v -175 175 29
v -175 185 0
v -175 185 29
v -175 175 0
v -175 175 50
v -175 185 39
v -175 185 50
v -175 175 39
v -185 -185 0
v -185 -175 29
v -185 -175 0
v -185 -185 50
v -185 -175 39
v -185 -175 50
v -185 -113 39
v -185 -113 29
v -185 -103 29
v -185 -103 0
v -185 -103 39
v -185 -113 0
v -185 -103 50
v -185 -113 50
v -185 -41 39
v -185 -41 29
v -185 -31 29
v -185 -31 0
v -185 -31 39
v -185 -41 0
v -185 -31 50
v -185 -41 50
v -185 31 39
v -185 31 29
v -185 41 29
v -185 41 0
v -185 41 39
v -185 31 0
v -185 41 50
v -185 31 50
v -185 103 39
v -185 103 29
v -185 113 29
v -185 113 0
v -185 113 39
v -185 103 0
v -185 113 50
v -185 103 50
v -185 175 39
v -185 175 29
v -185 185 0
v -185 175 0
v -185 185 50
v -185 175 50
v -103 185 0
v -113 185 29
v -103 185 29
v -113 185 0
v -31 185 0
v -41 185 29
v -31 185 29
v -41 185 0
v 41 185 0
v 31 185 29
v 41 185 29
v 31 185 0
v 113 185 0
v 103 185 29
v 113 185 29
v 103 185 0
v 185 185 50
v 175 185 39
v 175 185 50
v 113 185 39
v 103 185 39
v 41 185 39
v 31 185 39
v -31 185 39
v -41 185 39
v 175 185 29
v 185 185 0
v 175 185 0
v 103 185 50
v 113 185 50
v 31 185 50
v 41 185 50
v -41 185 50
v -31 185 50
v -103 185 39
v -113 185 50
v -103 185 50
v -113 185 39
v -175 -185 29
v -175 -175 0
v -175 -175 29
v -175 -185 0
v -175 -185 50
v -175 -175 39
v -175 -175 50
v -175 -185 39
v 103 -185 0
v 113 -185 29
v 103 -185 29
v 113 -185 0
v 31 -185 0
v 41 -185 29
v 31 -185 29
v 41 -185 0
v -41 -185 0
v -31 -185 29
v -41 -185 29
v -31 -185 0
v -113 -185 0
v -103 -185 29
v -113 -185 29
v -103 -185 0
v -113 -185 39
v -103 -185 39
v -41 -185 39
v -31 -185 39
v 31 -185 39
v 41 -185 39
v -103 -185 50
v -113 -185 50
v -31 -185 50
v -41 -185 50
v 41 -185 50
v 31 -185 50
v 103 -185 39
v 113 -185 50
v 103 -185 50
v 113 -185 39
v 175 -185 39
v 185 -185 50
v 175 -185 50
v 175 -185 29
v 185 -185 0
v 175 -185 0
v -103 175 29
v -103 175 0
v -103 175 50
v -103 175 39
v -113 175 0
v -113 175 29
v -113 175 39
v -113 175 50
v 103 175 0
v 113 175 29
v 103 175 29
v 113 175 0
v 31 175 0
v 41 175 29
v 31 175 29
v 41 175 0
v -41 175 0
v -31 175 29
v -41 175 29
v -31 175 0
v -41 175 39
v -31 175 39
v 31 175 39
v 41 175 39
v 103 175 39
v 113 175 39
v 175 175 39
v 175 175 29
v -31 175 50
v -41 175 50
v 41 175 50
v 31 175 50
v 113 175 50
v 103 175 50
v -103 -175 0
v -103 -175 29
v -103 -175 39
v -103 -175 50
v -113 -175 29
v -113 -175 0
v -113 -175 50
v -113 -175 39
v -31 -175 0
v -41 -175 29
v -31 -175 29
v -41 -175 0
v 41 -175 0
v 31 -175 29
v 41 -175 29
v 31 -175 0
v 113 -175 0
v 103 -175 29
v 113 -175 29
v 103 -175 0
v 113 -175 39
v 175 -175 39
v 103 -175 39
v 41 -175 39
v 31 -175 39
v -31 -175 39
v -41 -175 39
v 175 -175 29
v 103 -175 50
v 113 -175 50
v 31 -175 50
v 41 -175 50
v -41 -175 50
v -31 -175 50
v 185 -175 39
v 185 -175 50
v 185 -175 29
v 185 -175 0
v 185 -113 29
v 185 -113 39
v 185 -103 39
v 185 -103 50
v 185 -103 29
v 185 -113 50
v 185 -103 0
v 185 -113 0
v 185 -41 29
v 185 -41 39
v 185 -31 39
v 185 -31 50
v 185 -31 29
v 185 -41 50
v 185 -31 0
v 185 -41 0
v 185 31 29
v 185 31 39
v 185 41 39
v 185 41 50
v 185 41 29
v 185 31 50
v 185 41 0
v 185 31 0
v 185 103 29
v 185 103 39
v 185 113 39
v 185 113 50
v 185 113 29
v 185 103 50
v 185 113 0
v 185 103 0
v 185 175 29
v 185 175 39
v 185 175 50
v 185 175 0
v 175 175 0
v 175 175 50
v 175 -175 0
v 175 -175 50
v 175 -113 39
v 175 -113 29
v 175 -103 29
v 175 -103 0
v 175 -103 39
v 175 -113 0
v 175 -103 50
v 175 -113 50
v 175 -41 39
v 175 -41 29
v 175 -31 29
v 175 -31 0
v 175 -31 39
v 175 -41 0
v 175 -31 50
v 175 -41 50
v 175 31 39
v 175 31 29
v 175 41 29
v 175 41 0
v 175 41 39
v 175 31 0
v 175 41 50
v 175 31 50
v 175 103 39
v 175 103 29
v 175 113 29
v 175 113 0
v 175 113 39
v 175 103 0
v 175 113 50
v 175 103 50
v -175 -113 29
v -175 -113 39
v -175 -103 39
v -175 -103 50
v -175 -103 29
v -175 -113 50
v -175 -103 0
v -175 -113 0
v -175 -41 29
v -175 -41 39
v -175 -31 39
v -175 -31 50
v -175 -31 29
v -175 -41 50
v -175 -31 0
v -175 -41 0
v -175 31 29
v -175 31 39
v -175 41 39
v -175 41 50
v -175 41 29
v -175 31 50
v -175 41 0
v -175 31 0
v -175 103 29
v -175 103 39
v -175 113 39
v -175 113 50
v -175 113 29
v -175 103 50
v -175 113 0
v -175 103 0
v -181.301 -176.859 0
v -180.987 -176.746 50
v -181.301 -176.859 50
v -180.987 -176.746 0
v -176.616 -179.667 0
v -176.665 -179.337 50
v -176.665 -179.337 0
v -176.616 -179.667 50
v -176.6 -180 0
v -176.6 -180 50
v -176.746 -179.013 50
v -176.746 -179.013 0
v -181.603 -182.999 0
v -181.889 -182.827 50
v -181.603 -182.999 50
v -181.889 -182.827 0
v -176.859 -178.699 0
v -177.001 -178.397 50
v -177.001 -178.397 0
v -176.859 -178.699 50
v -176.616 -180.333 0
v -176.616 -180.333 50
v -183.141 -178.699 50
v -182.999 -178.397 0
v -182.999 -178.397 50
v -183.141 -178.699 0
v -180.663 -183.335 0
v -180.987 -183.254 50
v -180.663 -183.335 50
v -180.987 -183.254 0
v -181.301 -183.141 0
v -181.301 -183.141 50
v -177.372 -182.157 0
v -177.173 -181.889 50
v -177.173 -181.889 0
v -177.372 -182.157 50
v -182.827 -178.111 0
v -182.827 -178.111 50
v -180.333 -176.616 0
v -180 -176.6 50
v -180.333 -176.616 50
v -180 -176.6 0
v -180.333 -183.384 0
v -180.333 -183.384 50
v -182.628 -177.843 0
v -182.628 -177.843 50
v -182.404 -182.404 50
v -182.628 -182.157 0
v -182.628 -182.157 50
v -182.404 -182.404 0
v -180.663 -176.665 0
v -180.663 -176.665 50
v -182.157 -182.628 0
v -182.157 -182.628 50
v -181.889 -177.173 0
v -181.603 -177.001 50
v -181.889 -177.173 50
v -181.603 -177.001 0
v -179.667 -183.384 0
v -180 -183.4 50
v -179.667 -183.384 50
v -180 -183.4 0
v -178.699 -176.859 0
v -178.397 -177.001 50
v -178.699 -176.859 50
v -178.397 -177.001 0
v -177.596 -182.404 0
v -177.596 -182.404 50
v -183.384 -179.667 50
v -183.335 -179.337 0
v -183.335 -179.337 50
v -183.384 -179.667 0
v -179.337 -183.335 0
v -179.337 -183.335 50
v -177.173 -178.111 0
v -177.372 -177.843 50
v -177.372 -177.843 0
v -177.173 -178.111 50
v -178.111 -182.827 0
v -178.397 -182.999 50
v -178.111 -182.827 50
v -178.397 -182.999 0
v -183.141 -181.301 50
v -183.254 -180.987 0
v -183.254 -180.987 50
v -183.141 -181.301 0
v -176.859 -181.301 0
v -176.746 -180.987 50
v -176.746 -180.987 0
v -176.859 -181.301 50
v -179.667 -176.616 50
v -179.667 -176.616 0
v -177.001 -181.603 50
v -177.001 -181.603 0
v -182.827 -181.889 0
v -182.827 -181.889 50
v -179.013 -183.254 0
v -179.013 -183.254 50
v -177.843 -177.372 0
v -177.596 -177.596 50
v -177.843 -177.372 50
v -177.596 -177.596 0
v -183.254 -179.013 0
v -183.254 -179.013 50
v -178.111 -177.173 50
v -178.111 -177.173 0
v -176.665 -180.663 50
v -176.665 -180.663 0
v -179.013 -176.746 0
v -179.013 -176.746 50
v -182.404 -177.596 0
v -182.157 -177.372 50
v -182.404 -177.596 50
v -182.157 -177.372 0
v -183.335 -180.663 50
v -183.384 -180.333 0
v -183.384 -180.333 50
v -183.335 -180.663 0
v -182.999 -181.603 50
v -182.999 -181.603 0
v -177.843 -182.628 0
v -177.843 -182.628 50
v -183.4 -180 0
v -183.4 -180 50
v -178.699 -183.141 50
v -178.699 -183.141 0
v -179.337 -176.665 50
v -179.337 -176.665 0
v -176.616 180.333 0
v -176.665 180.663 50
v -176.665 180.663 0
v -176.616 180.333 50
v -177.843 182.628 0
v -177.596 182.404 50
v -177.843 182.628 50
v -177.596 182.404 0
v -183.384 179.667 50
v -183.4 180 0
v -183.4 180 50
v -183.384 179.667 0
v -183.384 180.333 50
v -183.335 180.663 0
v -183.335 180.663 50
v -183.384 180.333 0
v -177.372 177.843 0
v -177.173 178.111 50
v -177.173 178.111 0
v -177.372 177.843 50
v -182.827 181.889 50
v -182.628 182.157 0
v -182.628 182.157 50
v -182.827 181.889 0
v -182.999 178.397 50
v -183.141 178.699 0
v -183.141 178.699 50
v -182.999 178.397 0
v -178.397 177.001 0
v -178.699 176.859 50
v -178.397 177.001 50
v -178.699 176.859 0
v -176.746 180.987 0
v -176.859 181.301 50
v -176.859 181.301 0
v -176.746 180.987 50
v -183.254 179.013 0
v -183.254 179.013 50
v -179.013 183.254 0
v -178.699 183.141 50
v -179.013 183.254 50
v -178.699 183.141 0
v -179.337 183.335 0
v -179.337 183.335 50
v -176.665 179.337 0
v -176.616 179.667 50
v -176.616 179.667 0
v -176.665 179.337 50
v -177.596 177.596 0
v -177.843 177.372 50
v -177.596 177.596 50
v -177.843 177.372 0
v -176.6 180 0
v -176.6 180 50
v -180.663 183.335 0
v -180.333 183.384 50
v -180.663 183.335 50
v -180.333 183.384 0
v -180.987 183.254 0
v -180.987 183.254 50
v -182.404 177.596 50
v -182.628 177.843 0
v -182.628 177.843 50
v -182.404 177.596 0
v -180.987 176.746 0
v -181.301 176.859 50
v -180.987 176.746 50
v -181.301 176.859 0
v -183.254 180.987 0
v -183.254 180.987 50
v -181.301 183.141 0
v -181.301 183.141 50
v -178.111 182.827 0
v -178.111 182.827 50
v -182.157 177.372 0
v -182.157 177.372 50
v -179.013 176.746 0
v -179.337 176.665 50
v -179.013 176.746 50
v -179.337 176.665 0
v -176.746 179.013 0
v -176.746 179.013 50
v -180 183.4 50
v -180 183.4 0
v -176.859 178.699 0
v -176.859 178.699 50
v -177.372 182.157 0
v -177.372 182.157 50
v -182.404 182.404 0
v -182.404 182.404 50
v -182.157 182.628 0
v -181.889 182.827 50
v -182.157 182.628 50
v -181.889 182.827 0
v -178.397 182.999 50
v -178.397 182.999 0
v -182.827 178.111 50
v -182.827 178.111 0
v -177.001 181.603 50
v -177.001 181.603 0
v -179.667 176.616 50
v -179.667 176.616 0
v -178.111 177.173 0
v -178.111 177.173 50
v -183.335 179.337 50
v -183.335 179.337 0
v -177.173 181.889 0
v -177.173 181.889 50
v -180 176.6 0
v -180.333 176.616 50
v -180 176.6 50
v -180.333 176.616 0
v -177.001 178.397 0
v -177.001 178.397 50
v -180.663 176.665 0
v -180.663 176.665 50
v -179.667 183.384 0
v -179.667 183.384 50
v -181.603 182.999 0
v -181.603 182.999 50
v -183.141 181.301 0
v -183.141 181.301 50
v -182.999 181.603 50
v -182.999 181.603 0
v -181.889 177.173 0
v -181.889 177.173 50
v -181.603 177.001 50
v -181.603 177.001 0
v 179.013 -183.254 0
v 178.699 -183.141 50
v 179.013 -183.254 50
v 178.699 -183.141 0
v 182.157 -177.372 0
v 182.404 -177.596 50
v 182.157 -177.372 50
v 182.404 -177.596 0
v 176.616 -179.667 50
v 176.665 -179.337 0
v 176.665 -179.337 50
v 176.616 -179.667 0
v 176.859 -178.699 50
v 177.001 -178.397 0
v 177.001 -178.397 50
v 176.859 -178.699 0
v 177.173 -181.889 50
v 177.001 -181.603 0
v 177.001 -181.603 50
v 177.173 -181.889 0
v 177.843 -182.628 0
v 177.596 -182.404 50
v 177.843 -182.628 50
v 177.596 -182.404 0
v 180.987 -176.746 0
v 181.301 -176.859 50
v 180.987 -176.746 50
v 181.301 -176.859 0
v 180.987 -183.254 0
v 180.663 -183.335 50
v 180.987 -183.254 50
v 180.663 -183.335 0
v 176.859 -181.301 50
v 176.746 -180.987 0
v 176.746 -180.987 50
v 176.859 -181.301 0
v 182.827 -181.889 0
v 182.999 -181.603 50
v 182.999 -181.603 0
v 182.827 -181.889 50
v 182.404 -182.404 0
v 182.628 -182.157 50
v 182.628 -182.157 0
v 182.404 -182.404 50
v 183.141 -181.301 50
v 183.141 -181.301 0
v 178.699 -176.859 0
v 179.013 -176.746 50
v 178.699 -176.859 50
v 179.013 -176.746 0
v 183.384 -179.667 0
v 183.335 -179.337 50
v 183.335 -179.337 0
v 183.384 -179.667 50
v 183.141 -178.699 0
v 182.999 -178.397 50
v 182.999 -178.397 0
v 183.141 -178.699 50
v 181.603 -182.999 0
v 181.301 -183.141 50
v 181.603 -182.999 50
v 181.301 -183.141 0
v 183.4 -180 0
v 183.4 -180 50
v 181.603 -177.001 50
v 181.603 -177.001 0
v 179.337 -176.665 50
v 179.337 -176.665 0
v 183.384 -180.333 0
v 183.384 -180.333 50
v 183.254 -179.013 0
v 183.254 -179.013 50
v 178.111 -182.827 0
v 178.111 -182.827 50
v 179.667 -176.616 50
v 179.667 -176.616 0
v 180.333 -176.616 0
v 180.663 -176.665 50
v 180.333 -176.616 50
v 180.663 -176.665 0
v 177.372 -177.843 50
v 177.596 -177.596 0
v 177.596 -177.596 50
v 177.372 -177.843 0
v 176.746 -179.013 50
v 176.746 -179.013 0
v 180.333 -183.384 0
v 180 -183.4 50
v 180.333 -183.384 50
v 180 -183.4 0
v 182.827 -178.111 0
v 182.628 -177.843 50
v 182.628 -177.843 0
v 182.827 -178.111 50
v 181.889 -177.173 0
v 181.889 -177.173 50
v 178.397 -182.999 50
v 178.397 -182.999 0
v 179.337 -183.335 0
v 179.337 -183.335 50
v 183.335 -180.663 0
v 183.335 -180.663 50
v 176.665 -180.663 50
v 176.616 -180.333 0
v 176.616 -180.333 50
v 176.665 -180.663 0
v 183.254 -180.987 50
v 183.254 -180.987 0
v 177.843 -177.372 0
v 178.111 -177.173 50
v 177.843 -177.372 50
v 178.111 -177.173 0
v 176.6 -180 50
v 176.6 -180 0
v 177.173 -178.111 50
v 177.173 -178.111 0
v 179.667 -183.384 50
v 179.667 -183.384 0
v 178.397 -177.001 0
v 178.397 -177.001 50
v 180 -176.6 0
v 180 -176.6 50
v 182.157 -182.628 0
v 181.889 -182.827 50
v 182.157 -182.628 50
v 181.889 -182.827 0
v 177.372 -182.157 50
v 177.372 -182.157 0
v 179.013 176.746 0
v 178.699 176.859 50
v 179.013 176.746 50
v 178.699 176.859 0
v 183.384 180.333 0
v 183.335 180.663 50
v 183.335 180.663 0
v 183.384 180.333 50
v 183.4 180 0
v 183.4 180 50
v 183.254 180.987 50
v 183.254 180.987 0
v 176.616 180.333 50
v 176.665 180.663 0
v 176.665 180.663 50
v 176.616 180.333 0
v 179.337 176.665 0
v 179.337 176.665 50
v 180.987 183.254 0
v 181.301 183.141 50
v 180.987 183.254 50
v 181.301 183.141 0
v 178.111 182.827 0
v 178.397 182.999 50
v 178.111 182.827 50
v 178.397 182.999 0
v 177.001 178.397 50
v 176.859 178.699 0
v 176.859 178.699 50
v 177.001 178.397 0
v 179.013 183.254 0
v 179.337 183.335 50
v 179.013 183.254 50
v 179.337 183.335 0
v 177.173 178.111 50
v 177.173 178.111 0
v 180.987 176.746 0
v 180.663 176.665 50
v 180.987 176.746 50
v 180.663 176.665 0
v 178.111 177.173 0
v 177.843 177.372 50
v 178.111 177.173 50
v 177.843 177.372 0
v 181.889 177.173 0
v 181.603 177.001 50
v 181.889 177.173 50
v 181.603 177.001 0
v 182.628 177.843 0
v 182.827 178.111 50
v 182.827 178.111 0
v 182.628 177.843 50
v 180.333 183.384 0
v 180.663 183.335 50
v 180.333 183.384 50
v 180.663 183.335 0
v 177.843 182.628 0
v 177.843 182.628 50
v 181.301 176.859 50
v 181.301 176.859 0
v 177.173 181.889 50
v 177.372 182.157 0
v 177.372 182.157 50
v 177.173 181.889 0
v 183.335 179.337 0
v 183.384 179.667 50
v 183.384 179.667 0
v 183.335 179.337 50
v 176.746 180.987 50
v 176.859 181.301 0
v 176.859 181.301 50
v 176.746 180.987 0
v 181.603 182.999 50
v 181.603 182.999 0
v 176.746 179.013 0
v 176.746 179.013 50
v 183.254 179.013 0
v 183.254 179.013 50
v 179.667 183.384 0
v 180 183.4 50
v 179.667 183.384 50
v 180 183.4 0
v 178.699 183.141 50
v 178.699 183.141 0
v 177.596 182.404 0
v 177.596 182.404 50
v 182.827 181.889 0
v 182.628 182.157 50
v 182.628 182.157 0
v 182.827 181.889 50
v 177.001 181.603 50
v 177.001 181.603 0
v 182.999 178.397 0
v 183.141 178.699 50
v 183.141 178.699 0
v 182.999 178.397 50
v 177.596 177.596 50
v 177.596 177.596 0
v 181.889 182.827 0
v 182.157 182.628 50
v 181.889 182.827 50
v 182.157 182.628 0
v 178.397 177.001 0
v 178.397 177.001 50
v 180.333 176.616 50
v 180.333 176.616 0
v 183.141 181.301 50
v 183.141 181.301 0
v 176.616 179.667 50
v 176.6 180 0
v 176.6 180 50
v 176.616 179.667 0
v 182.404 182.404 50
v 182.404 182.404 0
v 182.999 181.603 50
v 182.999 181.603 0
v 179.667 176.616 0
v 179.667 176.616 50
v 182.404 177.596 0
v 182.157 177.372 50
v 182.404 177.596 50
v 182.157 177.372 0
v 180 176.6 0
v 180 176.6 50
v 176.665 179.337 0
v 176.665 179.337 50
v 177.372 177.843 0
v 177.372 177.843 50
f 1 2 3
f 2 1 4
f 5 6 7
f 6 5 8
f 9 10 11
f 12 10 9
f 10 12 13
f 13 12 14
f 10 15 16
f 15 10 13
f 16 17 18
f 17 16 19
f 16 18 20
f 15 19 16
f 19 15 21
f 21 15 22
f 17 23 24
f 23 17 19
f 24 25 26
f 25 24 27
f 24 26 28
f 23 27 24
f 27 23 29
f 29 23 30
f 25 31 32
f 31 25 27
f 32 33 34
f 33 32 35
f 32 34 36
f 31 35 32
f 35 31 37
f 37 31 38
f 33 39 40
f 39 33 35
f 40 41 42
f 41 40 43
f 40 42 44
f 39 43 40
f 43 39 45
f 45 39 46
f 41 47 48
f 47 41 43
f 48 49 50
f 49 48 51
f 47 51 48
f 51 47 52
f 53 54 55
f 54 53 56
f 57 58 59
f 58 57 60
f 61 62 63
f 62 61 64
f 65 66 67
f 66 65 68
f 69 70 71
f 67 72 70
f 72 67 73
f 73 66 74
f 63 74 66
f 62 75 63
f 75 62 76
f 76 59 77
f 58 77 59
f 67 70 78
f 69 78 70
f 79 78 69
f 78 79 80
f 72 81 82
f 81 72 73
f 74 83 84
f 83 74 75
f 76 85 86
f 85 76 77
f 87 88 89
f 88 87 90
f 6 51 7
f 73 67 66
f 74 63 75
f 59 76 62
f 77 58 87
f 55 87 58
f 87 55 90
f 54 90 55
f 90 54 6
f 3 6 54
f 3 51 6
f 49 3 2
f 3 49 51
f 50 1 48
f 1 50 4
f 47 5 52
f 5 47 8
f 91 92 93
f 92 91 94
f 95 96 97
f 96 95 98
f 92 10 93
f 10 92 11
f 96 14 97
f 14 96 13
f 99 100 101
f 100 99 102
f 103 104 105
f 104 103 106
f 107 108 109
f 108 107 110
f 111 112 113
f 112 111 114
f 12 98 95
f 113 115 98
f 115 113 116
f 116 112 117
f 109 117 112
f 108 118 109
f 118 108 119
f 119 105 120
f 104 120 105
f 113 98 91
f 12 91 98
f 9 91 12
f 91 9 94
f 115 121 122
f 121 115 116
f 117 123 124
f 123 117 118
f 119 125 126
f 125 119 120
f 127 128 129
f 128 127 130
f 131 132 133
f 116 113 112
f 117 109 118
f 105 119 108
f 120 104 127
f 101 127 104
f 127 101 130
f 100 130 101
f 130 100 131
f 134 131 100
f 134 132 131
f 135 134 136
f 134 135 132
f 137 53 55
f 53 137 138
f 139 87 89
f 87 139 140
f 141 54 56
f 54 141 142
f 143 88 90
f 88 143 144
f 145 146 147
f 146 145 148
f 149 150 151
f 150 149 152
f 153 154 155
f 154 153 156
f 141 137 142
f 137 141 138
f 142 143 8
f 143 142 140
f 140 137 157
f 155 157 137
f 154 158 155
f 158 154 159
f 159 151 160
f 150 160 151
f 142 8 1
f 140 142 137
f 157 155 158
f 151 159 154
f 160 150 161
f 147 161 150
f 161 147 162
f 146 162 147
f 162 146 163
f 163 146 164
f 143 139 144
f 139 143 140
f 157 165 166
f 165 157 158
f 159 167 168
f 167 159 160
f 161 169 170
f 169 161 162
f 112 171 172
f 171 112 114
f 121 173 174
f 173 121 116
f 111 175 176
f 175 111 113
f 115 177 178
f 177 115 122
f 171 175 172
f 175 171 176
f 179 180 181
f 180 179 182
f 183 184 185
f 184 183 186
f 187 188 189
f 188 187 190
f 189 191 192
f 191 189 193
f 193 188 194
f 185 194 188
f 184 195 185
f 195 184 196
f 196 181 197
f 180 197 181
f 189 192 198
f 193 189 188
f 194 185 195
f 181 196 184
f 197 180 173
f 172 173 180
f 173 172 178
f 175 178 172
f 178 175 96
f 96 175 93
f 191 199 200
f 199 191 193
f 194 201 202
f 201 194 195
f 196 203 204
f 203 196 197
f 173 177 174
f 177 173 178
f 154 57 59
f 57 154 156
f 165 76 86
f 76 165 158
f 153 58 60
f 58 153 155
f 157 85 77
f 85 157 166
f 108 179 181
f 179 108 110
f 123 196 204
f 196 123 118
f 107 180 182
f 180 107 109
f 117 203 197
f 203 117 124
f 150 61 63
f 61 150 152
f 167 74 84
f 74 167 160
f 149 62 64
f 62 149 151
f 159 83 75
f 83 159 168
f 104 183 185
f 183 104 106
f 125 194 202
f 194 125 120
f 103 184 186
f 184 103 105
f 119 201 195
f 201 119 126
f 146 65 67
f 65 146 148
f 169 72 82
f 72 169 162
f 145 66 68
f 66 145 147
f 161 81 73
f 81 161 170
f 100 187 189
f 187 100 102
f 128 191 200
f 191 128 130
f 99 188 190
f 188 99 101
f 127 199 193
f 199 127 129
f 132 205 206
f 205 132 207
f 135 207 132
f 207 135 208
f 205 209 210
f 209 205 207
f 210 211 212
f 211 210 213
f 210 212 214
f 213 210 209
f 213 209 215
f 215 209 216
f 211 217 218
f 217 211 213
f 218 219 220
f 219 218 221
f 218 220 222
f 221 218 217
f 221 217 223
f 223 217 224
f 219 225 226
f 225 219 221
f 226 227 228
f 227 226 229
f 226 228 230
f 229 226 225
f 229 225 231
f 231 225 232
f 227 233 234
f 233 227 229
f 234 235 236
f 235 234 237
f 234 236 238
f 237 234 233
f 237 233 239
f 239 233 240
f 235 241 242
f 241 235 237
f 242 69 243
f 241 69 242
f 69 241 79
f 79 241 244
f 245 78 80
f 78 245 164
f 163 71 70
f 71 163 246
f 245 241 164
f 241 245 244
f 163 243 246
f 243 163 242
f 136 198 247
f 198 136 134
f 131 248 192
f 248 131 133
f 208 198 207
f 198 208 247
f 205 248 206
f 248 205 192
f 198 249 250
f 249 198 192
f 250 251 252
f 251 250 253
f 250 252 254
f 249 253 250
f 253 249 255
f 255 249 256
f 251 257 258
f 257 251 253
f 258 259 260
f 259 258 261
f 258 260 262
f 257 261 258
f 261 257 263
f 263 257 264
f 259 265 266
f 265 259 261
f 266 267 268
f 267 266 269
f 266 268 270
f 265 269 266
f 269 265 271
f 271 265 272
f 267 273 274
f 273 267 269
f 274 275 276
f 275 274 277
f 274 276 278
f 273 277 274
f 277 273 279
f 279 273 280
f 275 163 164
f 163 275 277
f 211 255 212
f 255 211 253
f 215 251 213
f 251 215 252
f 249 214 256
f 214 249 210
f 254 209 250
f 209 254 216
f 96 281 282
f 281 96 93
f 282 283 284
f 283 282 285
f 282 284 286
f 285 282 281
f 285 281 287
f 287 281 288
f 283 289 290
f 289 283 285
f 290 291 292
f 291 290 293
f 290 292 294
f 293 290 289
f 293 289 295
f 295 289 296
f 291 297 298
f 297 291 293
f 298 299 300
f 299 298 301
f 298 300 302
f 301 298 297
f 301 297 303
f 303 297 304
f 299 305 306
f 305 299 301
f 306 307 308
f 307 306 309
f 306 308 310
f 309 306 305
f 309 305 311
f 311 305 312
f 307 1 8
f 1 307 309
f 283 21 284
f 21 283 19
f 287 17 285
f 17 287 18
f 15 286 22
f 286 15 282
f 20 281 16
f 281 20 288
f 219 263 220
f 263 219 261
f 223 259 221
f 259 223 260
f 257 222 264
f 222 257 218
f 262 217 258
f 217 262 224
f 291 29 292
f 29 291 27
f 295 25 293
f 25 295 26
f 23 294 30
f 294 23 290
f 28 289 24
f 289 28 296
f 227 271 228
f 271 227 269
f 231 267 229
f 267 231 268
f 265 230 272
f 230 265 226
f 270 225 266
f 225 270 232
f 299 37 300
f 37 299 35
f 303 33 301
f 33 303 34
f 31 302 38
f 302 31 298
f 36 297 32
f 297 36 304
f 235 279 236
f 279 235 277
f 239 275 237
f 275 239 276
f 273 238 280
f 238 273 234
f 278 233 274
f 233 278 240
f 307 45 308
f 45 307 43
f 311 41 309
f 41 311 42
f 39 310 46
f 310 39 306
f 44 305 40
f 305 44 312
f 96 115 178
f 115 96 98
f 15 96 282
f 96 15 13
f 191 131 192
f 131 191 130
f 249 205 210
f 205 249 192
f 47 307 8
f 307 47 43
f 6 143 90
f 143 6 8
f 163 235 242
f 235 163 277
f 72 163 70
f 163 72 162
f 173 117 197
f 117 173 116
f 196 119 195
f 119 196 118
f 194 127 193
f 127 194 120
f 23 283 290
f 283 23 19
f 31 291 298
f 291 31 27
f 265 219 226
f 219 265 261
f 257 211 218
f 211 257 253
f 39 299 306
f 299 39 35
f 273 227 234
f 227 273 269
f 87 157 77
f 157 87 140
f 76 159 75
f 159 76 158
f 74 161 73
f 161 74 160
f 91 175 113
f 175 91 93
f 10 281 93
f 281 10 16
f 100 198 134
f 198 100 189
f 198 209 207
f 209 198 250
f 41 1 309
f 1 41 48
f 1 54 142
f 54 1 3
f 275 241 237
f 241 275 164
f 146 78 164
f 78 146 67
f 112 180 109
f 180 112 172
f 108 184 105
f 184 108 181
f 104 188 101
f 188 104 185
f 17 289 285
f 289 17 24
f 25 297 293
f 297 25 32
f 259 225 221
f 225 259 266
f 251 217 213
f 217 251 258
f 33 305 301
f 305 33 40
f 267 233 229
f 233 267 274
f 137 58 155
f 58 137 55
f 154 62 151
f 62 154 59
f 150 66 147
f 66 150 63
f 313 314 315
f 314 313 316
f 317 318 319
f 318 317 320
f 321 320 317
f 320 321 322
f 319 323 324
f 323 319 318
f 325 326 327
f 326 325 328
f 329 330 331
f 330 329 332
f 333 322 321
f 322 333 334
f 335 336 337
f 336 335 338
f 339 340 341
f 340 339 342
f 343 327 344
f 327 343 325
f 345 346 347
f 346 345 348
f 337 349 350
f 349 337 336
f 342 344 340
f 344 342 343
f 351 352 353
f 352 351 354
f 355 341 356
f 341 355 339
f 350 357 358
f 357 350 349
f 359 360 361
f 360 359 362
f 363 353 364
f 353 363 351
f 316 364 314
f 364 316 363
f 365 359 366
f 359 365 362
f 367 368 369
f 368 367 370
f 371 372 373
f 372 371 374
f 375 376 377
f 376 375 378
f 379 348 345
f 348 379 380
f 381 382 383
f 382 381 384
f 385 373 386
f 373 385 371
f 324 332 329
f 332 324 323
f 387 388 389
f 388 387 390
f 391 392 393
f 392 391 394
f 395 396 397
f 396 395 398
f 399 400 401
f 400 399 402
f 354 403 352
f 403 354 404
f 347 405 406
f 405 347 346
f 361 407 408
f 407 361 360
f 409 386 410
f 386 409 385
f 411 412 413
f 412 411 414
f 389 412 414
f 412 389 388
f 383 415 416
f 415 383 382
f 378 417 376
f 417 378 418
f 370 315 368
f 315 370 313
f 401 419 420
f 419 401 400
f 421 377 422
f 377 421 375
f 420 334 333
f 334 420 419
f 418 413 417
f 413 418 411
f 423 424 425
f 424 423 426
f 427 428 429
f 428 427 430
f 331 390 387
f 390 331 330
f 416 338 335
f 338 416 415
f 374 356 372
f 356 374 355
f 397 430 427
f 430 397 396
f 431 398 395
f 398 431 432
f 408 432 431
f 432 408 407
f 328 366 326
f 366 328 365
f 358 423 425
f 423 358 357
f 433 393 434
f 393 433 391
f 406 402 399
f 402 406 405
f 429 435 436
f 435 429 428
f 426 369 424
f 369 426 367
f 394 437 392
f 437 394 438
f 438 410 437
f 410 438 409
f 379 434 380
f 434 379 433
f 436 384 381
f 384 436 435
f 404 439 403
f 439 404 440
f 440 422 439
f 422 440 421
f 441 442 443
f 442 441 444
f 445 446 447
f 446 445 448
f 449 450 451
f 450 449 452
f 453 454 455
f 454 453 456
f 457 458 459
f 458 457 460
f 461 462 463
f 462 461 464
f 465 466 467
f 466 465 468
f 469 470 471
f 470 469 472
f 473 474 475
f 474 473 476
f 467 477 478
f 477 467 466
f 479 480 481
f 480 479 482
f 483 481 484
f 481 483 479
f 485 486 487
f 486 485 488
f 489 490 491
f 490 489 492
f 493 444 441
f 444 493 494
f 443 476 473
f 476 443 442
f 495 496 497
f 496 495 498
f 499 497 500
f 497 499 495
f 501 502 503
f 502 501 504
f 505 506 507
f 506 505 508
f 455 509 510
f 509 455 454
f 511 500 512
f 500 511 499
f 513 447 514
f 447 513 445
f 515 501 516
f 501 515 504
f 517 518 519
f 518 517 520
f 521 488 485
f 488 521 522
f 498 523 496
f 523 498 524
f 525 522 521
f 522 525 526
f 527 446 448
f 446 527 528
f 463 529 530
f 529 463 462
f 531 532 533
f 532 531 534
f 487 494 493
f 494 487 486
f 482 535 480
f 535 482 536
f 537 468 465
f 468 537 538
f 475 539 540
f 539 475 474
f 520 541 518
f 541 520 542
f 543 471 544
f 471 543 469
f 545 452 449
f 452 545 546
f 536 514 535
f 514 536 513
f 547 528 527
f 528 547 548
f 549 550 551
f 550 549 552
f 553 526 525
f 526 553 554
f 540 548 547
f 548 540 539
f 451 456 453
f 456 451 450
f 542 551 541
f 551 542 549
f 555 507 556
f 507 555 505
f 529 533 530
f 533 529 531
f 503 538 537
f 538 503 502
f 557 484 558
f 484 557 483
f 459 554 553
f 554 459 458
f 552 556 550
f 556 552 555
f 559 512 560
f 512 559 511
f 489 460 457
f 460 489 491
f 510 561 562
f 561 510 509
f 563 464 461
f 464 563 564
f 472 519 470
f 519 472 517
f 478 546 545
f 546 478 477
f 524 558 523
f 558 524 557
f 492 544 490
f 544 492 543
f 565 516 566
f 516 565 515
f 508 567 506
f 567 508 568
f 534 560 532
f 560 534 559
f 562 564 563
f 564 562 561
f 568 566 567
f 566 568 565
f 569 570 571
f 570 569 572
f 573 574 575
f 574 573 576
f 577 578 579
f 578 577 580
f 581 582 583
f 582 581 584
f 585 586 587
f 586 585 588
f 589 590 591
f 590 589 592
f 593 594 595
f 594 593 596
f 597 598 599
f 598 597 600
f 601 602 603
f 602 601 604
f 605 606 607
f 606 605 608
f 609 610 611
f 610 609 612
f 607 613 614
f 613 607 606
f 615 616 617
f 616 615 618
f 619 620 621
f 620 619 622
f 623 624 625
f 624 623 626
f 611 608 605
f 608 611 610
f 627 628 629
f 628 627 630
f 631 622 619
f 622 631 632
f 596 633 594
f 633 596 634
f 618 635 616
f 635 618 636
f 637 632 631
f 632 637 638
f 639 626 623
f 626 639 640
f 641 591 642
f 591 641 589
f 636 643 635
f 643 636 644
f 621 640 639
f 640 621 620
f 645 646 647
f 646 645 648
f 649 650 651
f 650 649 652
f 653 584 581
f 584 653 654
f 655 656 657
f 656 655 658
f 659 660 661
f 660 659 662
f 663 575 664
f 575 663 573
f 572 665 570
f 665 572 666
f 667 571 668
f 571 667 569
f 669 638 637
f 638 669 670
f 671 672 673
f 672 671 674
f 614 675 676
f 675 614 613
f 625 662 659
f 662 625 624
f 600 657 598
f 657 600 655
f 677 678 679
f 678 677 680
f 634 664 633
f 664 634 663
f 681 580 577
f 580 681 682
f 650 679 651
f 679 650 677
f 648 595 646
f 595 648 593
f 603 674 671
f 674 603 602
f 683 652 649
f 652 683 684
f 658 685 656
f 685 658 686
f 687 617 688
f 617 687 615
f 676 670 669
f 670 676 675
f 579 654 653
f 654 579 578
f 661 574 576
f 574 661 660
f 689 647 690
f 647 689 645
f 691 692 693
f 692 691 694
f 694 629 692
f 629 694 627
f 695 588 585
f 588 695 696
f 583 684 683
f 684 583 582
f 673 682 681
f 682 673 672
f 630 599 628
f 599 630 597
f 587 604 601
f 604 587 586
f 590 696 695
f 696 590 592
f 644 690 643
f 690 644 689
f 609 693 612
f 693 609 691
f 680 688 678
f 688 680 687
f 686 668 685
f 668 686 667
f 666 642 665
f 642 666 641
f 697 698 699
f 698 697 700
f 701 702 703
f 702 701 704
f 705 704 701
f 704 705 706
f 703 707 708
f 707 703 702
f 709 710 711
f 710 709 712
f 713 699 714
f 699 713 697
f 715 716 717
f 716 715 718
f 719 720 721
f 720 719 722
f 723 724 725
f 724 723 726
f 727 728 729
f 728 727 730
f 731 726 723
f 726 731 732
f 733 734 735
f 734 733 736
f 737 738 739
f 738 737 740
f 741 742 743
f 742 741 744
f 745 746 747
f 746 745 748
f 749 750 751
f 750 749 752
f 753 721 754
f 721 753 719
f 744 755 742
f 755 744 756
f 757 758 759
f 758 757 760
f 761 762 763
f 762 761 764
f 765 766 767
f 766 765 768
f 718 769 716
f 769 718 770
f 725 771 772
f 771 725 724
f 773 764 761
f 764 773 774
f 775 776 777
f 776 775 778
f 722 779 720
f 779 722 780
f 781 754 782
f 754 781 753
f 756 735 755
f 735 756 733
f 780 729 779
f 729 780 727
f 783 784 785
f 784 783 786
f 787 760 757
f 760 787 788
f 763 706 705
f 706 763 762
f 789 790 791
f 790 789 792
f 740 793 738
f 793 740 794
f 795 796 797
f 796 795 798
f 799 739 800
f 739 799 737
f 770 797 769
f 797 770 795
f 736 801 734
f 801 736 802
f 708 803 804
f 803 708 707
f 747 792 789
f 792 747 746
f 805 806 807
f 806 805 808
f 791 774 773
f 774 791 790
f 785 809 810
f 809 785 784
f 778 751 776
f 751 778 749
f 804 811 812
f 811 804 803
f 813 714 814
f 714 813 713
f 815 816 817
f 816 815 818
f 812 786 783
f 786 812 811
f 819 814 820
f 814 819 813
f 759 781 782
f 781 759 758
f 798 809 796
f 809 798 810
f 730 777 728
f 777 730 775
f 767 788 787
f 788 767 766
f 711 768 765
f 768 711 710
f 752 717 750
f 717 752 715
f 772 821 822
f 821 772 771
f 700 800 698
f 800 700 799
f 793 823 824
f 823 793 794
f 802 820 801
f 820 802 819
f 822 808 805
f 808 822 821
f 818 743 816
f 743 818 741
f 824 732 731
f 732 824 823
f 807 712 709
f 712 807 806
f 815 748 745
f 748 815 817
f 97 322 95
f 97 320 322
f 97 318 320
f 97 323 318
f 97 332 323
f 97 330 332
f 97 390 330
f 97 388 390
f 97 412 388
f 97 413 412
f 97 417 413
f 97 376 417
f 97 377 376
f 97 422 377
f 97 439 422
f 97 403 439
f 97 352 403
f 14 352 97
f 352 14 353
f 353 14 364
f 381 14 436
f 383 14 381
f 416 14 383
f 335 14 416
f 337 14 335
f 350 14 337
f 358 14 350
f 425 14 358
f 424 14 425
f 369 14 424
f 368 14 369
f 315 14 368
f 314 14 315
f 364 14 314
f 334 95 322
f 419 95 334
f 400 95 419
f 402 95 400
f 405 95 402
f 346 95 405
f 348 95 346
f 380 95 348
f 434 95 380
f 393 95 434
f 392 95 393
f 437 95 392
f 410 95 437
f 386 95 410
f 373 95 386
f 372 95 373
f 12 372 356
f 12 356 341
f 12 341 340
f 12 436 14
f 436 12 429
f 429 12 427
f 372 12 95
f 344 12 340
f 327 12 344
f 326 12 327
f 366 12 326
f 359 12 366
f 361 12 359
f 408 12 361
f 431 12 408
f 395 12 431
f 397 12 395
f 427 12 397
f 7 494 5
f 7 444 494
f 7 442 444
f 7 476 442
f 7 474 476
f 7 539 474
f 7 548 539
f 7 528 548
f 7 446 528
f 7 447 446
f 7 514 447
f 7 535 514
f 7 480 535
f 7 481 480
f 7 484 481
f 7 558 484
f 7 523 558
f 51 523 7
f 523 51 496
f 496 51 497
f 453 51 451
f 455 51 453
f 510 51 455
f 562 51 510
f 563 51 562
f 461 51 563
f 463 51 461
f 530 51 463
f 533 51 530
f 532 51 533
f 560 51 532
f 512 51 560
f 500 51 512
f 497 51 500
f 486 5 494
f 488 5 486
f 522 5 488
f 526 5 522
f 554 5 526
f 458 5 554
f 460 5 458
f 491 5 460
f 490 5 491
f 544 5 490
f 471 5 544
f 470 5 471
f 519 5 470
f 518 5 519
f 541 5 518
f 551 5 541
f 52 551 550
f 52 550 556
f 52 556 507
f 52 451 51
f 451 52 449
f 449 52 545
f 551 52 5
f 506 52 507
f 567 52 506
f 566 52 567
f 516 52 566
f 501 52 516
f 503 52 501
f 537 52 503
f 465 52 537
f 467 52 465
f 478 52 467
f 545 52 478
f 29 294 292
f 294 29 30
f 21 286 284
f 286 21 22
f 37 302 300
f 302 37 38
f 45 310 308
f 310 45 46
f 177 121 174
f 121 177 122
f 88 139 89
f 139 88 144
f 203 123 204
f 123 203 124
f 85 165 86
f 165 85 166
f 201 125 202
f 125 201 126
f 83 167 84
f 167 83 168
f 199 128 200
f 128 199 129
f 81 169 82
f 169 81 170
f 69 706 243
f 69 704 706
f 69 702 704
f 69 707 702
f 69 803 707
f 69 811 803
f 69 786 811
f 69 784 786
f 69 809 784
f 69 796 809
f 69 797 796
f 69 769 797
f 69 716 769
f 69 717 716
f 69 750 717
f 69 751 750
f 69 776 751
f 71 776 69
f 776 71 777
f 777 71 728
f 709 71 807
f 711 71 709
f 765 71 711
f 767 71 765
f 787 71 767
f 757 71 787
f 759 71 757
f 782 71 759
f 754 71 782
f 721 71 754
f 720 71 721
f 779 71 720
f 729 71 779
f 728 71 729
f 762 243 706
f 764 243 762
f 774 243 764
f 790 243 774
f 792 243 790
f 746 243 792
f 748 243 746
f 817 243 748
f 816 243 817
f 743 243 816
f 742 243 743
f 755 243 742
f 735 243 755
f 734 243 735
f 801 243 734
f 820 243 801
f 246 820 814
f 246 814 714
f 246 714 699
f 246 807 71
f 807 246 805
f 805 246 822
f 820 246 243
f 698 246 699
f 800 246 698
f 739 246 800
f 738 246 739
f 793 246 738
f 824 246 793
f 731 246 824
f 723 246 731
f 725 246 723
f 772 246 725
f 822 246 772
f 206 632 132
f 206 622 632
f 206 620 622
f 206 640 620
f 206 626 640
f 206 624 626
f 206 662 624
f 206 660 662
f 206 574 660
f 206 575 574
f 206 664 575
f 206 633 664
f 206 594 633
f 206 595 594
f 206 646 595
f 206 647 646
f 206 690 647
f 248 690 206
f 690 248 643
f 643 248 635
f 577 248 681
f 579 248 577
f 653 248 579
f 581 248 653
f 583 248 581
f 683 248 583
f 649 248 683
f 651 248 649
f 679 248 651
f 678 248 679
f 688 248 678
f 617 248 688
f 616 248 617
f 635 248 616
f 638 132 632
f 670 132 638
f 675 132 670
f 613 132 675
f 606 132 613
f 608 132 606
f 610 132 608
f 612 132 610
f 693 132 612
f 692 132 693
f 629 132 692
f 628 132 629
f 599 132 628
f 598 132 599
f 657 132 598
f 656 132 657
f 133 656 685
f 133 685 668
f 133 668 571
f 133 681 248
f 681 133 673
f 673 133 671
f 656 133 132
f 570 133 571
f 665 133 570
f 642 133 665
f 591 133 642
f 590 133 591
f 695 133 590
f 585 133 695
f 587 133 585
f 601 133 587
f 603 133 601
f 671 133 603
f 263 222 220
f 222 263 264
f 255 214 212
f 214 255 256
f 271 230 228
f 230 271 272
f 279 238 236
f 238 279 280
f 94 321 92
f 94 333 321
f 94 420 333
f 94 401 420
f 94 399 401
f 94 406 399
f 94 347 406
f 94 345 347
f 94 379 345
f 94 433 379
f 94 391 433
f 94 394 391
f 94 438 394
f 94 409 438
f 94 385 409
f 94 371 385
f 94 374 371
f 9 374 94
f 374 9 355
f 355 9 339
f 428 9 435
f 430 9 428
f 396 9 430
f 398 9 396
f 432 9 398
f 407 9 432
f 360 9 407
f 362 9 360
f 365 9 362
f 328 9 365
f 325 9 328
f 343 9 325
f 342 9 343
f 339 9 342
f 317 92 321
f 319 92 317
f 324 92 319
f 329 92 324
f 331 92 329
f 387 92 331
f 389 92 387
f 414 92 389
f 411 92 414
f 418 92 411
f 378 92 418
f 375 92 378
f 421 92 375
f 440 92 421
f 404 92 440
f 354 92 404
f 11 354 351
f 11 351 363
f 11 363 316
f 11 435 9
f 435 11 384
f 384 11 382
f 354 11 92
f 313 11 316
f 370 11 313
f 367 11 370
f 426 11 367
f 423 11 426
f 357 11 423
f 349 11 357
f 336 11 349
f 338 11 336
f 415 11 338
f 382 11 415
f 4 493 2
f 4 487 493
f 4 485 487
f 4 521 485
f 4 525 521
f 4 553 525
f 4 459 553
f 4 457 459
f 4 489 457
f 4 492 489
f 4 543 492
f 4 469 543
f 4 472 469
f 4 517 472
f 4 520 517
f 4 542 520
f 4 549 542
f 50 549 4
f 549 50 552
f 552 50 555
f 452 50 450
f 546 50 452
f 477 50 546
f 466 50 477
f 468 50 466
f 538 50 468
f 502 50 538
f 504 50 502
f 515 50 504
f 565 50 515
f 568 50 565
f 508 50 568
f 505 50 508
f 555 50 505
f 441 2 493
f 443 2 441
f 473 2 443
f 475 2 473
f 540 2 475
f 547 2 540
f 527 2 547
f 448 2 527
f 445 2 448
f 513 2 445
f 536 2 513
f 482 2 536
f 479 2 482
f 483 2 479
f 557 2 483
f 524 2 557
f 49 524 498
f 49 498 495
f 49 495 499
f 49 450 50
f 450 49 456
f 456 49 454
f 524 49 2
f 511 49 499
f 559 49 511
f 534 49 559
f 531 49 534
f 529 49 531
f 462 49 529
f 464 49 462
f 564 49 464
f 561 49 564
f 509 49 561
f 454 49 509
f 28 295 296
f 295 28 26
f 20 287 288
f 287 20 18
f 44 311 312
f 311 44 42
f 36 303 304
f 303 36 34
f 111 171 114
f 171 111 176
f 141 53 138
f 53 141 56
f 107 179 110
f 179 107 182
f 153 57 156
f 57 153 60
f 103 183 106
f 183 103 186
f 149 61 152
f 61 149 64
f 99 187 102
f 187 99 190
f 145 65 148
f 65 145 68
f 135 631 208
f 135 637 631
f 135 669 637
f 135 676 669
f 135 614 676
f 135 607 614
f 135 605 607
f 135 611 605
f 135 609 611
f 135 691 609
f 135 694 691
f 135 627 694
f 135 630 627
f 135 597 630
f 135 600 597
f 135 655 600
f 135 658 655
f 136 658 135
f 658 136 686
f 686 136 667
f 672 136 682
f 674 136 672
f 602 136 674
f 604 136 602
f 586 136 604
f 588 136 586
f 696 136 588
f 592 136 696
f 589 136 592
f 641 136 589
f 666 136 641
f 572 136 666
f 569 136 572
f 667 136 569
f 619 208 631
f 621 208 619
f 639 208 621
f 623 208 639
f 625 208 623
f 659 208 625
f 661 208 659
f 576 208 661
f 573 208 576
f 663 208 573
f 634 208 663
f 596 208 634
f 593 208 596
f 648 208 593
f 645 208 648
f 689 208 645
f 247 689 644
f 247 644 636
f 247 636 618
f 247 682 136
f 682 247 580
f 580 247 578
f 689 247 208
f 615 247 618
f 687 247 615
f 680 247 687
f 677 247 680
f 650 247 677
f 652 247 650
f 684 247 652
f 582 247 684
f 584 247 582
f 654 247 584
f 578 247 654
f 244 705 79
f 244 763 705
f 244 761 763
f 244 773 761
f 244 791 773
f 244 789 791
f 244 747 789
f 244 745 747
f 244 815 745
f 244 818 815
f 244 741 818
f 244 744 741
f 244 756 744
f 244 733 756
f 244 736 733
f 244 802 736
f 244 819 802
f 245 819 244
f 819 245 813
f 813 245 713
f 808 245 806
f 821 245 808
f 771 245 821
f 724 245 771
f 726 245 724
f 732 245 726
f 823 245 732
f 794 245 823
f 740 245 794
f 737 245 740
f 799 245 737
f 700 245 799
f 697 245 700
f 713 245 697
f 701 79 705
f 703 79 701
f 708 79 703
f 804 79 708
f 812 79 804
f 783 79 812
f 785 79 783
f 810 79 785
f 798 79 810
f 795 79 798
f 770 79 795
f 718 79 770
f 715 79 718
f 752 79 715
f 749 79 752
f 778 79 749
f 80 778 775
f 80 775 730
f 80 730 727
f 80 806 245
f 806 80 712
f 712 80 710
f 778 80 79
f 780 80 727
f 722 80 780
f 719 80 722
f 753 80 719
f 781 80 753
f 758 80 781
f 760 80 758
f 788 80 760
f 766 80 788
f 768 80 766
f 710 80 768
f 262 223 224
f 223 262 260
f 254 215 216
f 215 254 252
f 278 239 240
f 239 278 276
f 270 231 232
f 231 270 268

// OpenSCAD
// Cage slice part (z0..z1). Units: mm.
// Print orientation: normal

bar=10;
inner=[350,350,700];
gap_xy=62;
gap_z=61;
hole_d=6.8;
$fn=64;

outer=[inner[0]+2*bar, inner[1]+2*bar, inner[2]+2*bar];
half=[outer[0]/2, outer[1]/2, outer[2]/2];

pitch_xy=bar+gap_xy;
pitch_z=bar+gap_z;

centers=[for(i=[0:5]) -(half[0]-bar/2) + i*pitch_xy];
z_levels=[for(i=[0:10]) i*pitch_z];

module vbar(xc,yc){ translate([xc-bar/2,yc-bar/2,0]) cube([bar,bar,outer[2]],center=false); }
module hbar_x(yc,z0){ translate([-half[0],yc-bar/2,z0]) cube([outer[0],bar,bar],center=false); }
module hbar_y(xc,z0){ translate([xc-bar/2,-half[1],z0]) cube([bar,outer[1],bar],center=false); }

module grid(z0){ union(){ for(yc=centers) hbar_x(yc,z0); for(xc=centers) hbar_y(xc,z0); } }

module side_verticals(){
  union(){
    for(xc=centers){ vbar(xc, half[1]-bar/2); vbar(xc,-half[1]+bar/2); }
    for(yc=centers){ vbar( half[0]-bar/2,yc); vbar(-half[0]+bar/2,yc); }
  }
}

module side_rings(){
  union(){
    for(z0=z_levels){
      hbar_x( half[1]-bar/2,z0); hbar_x(-half[1]+bar/2,z0);
      hbar_y( half[0]-bar/2,z0); hbar_y(-half[0]+bar/2,z0);
    }
  }
}

module rod_holes(){
  for(sx=[-1,1],sy=[-1,1]) translate([sx*(half[0]-bar/2), sy*(half[1]-bar/2), -1]) cylinder(d=hole_d,h=outer[2]+2,center=false);
}

module cage(){ difference(){ union(){ side_verticals(); side_rings(); grid(0); grid(outer[2]-bar); } rod_holes(); } }

module cage_slice(zmin,zmax){ intersection(){ cage(); translate([-1000,-1000,zmin]) cube([2000,2000,zmax-zmin],center=false); } }

z0=397; z1=447;
translate([0,0,-z0]) cage_slice(z0,z1);
